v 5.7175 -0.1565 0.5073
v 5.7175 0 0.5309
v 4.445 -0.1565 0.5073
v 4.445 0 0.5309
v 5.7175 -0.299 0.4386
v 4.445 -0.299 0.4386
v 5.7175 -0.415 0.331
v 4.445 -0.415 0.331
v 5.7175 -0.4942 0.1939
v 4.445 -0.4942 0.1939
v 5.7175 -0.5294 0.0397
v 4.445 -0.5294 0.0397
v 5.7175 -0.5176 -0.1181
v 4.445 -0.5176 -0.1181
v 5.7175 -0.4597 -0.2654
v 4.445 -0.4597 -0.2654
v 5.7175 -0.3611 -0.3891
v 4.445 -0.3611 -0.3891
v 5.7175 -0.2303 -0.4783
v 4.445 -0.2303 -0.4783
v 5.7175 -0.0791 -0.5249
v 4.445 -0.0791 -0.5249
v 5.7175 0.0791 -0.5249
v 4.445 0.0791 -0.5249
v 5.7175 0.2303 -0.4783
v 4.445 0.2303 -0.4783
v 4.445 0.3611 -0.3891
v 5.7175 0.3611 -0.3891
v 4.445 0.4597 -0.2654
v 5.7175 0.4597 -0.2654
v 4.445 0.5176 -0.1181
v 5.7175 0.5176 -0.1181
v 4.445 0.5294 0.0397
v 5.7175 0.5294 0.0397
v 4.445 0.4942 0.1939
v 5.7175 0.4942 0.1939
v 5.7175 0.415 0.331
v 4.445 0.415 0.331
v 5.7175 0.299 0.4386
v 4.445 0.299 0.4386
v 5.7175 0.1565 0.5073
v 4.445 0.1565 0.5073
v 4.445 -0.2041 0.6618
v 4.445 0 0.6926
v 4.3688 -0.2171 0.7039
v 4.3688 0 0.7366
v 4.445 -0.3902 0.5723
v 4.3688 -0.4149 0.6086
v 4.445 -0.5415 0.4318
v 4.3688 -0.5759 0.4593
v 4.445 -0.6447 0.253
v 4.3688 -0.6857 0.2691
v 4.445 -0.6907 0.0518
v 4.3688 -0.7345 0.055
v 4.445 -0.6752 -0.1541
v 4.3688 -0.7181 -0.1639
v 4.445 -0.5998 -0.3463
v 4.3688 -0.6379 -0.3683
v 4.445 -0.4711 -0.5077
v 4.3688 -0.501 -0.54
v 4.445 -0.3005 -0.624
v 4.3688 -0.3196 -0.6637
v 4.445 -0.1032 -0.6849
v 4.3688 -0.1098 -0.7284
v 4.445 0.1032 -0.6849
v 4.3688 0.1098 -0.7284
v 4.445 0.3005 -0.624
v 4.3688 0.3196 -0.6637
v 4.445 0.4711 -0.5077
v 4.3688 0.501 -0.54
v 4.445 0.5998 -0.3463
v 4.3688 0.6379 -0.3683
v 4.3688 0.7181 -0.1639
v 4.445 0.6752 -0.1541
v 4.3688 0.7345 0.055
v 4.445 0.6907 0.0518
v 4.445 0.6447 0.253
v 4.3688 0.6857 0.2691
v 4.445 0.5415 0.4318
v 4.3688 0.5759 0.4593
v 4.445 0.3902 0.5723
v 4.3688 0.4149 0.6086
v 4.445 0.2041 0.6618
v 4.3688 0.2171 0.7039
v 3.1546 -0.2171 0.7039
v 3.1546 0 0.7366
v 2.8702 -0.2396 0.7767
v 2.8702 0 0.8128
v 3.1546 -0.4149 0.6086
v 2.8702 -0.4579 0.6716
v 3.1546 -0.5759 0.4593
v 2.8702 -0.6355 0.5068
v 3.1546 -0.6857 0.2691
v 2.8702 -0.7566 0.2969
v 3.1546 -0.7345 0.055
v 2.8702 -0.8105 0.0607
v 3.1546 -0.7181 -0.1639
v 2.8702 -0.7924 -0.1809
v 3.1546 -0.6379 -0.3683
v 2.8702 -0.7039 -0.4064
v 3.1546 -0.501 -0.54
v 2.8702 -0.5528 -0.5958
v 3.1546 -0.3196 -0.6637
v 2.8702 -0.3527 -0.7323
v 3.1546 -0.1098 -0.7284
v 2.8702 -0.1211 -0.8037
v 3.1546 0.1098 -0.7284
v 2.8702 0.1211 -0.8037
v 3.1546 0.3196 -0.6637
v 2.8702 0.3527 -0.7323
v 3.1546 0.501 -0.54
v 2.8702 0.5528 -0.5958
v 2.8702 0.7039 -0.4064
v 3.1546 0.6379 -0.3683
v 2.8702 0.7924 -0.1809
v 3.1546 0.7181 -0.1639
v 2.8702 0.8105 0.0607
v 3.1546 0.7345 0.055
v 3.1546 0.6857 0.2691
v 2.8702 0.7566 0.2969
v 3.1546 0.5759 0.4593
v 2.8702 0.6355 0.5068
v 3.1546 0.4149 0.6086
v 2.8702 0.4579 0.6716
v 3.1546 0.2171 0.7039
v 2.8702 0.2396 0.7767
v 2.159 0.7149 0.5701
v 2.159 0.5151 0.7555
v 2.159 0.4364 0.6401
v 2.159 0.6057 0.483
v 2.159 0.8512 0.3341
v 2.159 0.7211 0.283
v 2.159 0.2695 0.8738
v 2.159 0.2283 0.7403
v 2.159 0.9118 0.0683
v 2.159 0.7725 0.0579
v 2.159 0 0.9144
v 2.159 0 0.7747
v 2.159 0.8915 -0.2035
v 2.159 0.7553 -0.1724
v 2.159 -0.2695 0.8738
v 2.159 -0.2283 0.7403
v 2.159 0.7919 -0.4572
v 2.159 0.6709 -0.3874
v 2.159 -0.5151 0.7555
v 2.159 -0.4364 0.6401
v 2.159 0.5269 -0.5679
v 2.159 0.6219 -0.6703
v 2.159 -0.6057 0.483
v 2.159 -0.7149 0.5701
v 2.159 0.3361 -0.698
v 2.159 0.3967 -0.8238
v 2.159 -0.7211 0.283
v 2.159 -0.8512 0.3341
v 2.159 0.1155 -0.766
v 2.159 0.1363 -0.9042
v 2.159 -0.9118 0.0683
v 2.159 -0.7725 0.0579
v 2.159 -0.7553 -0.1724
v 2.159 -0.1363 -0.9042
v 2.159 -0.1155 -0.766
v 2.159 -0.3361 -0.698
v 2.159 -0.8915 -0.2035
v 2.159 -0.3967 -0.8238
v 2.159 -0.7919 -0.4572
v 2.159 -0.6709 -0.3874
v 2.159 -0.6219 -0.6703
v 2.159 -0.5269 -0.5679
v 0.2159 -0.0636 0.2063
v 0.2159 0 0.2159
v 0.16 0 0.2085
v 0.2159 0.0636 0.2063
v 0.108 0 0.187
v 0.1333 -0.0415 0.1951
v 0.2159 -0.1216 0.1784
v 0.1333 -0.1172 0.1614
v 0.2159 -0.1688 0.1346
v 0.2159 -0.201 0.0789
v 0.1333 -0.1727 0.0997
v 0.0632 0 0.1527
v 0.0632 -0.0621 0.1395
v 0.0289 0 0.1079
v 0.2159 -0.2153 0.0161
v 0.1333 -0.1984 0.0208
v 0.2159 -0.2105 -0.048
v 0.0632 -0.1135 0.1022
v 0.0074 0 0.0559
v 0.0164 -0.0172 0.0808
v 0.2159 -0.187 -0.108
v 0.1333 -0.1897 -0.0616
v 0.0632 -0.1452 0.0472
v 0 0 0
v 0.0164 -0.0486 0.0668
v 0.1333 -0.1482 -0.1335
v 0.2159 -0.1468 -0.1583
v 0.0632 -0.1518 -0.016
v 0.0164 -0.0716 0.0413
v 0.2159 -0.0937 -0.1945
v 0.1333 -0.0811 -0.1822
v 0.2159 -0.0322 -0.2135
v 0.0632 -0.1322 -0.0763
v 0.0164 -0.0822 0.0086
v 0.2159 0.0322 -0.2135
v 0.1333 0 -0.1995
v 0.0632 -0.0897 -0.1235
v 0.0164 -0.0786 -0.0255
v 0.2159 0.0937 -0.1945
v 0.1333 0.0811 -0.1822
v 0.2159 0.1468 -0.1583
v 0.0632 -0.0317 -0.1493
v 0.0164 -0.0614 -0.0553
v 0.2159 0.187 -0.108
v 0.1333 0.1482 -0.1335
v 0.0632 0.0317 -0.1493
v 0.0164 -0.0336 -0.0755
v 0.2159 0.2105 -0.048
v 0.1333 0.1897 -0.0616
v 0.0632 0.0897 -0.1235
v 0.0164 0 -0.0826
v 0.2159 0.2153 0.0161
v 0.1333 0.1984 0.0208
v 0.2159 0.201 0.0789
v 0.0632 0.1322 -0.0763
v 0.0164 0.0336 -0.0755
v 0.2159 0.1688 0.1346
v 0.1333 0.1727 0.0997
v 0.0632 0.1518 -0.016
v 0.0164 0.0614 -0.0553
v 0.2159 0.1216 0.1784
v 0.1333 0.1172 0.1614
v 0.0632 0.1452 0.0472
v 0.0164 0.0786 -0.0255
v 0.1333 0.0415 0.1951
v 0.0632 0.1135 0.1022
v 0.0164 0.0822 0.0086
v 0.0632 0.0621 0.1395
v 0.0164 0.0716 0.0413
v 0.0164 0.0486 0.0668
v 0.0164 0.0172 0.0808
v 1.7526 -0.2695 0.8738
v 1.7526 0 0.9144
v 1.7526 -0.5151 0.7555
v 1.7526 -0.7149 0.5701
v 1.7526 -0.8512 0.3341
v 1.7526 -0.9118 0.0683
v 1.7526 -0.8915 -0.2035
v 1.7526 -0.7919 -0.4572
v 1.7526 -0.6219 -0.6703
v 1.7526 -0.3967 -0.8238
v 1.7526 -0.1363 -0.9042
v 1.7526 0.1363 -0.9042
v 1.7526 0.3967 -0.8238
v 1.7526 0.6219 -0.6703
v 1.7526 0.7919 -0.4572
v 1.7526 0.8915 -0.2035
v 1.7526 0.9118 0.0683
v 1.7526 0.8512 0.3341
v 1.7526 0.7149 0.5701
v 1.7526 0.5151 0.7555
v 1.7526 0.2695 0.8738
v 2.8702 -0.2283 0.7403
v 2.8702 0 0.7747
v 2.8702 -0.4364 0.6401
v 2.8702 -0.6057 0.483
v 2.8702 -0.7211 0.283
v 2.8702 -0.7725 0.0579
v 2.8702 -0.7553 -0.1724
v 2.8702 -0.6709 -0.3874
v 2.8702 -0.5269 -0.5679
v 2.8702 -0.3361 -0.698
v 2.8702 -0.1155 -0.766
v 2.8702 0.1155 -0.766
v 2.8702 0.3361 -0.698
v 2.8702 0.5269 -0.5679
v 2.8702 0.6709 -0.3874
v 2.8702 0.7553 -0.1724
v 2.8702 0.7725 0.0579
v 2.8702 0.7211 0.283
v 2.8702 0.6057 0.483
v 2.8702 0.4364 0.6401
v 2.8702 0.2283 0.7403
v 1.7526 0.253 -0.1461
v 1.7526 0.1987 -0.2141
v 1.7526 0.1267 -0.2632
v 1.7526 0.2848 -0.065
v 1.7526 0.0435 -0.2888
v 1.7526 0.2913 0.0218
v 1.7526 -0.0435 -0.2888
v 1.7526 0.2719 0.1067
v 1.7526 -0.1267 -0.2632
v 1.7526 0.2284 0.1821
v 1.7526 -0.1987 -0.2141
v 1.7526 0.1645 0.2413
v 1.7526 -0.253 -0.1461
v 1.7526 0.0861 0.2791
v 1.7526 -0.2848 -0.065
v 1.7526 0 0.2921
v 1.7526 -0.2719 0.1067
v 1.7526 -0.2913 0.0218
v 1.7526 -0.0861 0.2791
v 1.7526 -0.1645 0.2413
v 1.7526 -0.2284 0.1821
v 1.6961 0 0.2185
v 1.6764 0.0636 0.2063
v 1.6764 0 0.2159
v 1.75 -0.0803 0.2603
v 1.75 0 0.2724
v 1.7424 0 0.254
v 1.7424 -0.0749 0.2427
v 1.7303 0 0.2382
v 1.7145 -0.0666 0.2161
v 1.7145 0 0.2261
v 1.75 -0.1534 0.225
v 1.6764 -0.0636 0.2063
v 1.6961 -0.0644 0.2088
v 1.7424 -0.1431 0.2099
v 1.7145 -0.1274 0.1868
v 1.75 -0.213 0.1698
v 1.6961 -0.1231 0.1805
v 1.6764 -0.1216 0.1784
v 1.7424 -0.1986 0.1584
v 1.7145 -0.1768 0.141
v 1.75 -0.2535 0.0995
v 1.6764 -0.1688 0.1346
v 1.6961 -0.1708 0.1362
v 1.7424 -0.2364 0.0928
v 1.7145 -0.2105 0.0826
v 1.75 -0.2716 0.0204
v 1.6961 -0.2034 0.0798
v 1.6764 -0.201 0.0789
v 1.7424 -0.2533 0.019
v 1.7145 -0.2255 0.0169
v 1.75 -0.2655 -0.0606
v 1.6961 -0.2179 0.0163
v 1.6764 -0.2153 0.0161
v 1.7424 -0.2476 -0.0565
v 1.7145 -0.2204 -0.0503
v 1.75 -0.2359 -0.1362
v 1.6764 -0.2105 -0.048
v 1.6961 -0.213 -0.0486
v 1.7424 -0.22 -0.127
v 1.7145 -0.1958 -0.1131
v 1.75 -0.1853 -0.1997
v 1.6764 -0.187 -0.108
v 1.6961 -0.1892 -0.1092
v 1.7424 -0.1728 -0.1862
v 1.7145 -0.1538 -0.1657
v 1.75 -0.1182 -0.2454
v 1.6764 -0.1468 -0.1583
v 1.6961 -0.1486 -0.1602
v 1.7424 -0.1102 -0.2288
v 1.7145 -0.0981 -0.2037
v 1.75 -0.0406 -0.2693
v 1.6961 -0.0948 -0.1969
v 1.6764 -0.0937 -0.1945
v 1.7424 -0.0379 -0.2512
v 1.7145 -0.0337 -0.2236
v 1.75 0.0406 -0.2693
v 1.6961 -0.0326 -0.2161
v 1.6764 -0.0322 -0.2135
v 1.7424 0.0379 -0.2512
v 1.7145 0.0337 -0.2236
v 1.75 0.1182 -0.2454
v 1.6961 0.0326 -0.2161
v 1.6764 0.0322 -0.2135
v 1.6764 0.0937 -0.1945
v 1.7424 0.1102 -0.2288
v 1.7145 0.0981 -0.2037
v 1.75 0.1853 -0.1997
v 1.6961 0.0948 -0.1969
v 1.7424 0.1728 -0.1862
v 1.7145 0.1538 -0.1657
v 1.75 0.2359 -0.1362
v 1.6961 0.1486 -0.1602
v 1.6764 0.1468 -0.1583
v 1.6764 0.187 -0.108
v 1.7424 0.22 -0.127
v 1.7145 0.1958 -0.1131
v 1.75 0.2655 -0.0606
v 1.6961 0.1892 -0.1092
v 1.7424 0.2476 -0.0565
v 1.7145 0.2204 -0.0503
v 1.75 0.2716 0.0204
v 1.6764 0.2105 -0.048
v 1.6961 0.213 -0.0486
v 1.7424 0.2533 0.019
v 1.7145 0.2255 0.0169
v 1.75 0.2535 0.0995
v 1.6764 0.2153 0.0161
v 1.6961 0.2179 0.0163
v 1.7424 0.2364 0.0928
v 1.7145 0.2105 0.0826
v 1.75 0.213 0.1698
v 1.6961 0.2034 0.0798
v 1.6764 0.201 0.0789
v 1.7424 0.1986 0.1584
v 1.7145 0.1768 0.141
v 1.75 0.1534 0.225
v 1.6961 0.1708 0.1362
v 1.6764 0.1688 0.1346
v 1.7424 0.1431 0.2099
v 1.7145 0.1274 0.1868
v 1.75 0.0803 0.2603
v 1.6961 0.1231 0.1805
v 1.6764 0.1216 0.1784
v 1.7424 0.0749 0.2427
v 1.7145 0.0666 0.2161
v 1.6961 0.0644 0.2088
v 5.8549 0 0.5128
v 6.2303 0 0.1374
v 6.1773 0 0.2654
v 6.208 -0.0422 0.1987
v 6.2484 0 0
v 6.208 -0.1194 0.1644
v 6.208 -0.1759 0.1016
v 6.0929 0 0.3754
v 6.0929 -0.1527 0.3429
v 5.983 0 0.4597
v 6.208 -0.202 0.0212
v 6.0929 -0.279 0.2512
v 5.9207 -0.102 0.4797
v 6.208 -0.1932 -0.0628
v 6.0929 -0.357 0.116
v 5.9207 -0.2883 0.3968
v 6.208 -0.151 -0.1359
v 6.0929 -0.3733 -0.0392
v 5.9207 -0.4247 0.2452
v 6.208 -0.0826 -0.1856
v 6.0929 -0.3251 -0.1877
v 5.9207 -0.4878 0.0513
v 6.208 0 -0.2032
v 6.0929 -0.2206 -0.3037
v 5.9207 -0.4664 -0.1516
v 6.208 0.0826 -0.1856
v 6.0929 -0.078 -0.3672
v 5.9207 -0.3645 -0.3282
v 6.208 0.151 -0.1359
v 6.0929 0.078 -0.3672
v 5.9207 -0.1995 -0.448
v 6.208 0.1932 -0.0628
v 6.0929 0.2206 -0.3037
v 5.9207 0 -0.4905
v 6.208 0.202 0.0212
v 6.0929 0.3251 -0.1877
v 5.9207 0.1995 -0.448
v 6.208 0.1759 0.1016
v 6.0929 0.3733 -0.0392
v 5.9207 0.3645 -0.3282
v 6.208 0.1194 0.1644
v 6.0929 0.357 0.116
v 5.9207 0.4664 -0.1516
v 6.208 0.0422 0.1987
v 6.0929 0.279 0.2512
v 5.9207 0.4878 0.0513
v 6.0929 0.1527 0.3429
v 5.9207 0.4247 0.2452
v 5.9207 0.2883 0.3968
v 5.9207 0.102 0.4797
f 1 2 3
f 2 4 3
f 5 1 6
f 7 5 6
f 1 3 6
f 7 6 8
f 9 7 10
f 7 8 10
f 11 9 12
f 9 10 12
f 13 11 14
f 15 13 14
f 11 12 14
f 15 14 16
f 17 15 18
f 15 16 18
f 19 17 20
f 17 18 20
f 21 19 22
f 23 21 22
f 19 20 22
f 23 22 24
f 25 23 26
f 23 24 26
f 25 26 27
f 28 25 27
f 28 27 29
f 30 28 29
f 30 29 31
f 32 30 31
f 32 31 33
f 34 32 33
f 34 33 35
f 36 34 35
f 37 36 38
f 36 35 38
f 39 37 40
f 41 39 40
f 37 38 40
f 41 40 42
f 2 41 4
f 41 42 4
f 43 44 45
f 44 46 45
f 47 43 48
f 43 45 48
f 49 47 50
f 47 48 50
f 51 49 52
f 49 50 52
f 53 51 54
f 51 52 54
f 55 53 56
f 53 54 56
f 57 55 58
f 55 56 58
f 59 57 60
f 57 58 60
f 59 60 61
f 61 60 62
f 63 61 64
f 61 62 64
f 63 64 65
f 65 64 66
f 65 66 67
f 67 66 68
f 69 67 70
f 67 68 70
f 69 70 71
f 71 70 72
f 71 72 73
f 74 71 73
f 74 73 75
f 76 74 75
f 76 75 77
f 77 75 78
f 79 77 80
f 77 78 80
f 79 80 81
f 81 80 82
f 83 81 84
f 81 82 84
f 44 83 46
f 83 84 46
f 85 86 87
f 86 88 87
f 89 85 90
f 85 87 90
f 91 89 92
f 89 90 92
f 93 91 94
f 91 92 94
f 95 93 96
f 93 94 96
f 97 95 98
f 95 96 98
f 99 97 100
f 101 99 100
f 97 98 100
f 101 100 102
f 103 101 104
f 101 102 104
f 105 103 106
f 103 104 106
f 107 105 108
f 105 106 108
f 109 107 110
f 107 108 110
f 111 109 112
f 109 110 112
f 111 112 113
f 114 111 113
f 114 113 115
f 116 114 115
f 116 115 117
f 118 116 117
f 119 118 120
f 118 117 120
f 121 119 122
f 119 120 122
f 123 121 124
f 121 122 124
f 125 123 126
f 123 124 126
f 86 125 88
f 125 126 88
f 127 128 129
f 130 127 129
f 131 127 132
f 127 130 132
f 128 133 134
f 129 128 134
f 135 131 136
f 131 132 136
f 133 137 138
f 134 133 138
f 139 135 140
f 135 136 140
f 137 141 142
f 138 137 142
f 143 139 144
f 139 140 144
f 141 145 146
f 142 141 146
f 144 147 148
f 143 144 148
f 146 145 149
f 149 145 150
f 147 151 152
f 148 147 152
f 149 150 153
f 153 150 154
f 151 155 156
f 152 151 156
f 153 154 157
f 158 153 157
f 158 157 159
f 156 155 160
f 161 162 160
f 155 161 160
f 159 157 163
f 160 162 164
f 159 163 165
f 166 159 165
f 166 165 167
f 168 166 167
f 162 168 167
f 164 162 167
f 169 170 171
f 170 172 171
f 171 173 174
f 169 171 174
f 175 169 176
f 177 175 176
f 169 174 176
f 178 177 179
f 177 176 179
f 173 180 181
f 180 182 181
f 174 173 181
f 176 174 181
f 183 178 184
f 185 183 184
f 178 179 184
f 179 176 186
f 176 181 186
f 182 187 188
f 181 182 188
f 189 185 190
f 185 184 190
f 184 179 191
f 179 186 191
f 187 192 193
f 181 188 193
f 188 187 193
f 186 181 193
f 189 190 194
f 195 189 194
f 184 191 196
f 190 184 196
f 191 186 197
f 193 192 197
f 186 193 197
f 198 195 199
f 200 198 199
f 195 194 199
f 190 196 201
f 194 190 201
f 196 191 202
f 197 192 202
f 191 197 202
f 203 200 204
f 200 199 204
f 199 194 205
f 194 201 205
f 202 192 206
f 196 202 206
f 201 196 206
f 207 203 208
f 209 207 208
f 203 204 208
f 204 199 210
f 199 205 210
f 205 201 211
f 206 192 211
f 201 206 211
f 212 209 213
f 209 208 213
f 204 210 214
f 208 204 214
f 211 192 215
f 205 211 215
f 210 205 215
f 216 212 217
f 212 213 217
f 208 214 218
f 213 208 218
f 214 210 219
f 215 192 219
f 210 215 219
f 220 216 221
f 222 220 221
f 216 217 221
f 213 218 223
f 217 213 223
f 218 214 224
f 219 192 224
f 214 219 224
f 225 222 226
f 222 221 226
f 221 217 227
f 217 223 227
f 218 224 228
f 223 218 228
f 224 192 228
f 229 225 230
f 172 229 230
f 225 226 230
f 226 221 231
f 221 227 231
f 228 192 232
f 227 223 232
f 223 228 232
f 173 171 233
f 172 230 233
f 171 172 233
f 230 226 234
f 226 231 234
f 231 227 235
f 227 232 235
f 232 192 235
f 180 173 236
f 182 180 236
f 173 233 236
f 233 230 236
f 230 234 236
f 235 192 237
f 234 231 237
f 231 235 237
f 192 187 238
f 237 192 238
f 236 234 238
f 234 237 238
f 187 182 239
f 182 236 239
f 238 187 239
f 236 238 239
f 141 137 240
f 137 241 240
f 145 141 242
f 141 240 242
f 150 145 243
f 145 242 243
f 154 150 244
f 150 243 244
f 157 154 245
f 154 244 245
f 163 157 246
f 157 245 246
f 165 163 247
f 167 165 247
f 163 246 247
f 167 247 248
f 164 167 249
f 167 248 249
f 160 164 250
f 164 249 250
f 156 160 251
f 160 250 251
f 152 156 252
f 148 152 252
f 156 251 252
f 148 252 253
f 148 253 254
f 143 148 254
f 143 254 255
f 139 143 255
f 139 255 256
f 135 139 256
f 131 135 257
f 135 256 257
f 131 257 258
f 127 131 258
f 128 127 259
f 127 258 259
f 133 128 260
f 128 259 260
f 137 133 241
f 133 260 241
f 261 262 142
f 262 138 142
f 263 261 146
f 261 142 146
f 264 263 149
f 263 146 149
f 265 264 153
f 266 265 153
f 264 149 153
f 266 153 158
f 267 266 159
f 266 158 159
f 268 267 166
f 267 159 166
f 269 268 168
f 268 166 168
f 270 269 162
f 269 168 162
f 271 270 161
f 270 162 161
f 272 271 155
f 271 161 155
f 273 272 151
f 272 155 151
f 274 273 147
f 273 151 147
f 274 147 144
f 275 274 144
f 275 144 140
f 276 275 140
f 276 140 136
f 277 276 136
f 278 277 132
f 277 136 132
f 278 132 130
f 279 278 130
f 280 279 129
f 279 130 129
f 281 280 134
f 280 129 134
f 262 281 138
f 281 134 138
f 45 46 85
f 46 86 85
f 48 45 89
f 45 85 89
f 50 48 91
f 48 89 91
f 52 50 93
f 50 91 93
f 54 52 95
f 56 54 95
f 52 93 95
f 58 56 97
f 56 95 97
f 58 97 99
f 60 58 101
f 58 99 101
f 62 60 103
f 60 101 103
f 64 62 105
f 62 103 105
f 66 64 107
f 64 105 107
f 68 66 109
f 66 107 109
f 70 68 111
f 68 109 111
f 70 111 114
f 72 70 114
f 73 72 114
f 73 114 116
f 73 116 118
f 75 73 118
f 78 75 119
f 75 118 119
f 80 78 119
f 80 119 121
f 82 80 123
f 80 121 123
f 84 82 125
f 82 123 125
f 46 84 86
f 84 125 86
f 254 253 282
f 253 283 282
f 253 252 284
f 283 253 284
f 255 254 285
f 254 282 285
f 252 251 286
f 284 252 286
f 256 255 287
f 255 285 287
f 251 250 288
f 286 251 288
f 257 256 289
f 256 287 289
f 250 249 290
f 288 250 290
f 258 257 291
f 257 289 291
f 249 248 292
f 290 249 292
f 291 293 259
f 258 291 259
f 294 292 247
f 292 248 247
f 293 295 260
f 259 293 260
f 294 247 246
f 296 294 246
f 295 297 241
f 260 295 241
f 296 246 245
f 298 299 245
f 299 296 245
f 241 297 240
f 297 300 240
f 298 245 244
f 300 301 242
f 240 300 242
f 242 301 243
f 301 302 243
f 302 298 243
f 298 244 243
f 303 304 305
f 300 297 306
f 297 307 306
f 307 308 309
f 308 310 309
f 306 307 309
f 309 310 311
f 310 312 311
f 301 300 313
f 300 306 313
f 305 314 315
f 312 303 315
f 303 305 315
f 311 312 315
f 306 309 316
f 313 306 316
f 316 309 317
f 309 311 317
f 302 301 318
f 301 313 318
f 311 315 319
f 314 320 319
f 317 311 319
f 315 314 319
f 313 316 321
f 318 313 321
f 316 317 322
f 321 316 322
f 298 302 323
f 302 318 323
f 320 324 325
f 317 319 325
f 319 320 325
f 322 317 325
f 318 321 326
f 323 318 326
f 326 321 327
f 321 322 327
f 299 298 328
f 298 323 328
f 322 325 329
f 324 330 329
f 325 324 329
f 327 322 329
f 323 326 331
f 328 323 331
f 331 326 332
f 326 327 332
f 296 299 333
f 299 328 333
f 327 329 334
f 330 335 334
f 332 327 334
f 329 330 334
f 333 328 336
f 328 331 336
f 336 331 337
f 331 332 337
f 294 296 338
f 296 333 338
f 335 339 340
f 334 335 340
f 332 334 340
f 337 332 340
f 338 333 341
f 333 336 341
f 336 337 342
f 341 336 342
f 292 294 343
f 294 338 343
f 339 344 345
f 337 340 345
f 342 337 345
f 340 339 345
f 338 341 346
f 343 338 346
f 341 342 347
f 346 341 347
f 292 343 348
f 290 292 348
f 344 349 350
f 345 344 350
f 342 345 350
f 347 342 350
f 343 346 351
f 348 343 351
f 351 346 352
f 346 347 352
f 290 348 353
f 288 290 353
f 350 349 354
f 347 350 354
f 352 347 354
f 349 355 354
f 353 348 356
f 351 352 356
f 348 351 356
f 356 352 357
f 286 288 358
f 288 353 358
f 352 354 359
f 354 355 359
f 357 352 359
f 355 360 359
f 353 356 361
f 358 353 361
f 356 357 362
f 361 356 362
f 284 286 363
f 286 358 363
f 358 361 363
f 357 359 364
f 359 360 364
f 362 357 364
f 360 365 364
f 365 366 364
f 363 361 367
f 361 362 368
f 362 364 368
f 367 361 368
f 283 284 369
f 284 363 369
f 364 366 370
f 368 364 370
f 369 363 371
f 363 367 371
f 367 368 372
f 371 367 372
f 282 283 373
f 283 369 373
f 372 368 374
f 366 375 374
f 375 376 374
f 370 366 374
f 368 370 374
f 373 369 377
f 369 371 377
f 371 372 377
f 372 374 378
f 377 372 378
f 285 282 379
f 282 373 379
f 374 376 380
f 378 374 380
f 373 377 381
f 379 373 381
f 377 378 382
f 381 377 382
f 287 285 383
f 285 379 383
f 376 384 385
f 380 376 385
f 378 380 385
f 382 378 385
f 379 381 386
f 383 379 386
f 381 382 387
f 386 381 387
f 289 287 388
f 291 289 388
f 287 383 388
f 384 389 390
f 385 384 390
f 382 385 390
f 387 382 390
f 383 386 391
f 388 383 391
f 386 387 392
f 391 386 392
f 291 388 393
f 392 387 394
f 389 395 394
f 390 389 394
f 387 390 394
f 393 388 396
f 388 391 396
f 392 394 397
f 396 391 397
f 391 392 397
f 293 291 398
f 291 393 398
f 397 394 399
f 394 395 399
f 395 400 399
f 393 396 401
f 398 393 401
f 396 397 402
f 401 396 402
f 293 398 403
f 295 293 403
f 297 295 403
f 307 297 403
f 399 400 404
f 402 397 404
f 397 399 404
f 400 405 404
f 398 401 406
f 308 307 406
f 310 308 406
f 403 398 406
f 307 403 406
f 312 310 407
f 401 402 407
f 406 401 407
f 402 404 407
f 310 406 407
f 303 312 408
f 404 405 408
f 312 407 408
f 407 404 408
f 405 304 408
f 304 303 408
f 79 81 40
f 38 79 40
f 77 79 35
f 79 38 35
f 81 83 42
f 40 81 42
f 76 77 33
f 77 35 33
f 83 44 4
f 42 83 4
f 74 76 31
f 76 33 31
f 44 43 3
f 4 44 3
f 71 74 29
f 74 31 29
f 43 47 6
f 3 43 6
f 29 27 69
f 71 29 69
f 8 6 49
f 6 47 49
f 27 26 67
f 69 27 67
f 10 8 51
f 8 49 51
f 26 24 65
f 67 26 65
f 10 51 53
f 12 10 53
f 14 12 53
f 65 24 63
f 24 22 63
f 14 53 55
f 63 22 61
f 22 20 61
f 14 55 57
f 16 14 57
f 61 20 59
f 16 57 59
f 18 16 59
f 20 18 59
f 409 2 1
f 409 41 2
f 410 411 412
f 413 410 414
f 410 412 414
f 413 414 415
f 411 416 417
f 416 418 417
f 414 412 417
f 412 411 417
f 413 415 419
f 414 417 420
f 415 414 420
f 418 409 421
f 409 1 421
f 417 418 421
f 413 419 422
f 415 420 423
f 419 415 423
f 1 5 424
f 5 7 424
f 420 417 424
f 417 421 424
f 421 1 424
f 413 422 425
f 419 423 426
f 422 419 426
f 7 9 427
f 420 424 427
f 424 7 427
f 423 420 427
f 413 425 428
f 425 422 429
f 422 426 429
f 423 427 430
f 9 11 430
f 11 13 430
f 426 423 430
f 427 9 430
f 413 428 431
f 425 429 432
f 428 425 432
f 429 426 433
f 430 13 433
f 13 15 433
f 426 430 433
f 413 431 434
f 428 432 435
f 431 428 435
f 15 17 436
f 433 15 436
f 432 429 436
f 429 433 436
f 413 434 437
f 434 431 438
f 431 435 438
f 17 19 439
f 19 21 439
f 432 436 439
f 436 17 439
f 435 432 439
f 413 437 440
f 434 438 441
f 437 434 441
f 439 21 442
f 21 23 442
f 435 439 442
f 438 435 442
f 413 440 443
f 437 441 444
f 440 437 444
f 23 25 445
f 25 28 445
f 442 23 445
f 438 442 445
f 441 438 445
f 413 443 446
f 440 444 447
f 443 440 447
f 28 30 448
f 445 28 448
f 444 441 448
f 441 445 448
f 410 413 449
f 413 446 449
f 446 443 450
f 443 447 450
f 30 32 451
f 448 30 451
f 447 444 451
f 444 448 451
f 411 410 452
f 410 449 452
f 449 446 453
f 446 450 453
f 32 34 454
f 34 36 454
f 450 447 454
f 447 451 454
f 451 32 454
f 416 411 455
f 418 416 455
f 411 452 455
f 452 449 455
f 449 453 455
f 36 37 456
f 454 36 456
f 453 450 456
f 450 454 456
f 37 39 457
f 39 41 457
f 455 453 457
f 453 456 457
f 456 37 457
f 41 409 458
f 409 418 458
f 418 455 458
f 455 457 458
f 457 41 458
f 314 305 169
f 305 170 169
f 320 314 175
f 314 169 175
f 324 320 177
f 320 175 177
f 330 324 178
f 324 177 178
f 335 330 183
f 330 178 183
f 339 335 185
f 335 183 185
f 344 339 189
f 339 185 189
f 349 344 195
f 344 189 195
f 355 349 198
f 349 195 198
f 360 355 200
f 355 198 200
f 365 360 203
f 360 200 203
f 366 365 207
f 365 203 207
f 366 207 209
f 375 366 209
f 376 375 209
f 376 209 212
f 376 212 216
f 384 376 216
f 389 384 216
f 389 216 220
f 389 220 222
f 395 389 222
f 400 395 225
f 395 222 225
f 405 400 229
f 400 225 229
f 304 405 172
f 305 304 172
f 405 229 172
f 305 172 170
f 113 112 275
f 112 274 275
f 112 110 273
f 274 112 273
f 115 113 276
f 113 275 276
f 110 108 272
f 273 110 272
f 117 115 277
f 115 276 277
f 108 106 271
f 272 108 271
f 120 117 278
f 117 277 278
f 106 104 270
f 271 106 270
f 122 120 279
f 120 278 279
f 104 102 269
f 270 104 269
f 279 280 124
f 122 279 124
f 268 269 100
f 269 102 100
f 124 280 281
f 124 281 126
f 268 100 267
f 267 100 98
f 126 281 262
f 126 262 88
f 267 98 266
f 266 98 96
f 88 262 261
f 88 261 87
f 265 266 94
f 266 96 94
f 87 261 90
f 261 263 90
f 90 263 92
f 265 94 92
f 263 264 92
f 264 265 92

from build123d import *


with BuildPart() as part:
    # Sketch1 → Revolve1 (revolve)
    with BuildSketch(Plane.XY, mode=Mode.PRIVATE) as revolve1_sk:
        with BuildLine():
            Line((0, 0), (6.2484, 0))
            ThreePointArc((6.2484, 0), (6.092914706, 0.375374706), (5.71754, 0.53086))
            Line((5.71754, 0.53086), (4.445, 0.53086))
            Line((4.445, 0.53086), (4.445, 0.692605909))
            Line((4.445, 0.692605909), (4.3688, 0.7366))
            Line((4.3688, 0.7366), (3.154582272, 0.7366))
            Line((3.154582272, 0.7366), (2.8702, 0.8128))
            Line((2.8702, 0.8128), (2.8702, 0.7747))
            Line((2.8702, 0.7747), (2.159, 0.7747))
            Line((2.159, 0.7747), (2.159, 0.9144))
            Line((2.159, 0.9144), (1.7526, 0.9144))
            Line((1.7526, 0.9144), (1.7526, 0.2921))
            ThreePointArc((1.7526, 0.2921), (1.730281537, 0.238218463), (1.6764, 0.2159))
            Line((1.6764, 0.2159), (0.2159, 0.2159))
            ThreePointArc((0.2159, 0.2159), (0.063235646, 0.152664354), (0, 0))
        make_face()
    revolve(revolve1_sk.sketch.rotate(Axis((0, 0, 0), (1, 0, 0)), 90), axis=Axis((0, 0, 0), (1, 0, 0)))


solid = part.part
